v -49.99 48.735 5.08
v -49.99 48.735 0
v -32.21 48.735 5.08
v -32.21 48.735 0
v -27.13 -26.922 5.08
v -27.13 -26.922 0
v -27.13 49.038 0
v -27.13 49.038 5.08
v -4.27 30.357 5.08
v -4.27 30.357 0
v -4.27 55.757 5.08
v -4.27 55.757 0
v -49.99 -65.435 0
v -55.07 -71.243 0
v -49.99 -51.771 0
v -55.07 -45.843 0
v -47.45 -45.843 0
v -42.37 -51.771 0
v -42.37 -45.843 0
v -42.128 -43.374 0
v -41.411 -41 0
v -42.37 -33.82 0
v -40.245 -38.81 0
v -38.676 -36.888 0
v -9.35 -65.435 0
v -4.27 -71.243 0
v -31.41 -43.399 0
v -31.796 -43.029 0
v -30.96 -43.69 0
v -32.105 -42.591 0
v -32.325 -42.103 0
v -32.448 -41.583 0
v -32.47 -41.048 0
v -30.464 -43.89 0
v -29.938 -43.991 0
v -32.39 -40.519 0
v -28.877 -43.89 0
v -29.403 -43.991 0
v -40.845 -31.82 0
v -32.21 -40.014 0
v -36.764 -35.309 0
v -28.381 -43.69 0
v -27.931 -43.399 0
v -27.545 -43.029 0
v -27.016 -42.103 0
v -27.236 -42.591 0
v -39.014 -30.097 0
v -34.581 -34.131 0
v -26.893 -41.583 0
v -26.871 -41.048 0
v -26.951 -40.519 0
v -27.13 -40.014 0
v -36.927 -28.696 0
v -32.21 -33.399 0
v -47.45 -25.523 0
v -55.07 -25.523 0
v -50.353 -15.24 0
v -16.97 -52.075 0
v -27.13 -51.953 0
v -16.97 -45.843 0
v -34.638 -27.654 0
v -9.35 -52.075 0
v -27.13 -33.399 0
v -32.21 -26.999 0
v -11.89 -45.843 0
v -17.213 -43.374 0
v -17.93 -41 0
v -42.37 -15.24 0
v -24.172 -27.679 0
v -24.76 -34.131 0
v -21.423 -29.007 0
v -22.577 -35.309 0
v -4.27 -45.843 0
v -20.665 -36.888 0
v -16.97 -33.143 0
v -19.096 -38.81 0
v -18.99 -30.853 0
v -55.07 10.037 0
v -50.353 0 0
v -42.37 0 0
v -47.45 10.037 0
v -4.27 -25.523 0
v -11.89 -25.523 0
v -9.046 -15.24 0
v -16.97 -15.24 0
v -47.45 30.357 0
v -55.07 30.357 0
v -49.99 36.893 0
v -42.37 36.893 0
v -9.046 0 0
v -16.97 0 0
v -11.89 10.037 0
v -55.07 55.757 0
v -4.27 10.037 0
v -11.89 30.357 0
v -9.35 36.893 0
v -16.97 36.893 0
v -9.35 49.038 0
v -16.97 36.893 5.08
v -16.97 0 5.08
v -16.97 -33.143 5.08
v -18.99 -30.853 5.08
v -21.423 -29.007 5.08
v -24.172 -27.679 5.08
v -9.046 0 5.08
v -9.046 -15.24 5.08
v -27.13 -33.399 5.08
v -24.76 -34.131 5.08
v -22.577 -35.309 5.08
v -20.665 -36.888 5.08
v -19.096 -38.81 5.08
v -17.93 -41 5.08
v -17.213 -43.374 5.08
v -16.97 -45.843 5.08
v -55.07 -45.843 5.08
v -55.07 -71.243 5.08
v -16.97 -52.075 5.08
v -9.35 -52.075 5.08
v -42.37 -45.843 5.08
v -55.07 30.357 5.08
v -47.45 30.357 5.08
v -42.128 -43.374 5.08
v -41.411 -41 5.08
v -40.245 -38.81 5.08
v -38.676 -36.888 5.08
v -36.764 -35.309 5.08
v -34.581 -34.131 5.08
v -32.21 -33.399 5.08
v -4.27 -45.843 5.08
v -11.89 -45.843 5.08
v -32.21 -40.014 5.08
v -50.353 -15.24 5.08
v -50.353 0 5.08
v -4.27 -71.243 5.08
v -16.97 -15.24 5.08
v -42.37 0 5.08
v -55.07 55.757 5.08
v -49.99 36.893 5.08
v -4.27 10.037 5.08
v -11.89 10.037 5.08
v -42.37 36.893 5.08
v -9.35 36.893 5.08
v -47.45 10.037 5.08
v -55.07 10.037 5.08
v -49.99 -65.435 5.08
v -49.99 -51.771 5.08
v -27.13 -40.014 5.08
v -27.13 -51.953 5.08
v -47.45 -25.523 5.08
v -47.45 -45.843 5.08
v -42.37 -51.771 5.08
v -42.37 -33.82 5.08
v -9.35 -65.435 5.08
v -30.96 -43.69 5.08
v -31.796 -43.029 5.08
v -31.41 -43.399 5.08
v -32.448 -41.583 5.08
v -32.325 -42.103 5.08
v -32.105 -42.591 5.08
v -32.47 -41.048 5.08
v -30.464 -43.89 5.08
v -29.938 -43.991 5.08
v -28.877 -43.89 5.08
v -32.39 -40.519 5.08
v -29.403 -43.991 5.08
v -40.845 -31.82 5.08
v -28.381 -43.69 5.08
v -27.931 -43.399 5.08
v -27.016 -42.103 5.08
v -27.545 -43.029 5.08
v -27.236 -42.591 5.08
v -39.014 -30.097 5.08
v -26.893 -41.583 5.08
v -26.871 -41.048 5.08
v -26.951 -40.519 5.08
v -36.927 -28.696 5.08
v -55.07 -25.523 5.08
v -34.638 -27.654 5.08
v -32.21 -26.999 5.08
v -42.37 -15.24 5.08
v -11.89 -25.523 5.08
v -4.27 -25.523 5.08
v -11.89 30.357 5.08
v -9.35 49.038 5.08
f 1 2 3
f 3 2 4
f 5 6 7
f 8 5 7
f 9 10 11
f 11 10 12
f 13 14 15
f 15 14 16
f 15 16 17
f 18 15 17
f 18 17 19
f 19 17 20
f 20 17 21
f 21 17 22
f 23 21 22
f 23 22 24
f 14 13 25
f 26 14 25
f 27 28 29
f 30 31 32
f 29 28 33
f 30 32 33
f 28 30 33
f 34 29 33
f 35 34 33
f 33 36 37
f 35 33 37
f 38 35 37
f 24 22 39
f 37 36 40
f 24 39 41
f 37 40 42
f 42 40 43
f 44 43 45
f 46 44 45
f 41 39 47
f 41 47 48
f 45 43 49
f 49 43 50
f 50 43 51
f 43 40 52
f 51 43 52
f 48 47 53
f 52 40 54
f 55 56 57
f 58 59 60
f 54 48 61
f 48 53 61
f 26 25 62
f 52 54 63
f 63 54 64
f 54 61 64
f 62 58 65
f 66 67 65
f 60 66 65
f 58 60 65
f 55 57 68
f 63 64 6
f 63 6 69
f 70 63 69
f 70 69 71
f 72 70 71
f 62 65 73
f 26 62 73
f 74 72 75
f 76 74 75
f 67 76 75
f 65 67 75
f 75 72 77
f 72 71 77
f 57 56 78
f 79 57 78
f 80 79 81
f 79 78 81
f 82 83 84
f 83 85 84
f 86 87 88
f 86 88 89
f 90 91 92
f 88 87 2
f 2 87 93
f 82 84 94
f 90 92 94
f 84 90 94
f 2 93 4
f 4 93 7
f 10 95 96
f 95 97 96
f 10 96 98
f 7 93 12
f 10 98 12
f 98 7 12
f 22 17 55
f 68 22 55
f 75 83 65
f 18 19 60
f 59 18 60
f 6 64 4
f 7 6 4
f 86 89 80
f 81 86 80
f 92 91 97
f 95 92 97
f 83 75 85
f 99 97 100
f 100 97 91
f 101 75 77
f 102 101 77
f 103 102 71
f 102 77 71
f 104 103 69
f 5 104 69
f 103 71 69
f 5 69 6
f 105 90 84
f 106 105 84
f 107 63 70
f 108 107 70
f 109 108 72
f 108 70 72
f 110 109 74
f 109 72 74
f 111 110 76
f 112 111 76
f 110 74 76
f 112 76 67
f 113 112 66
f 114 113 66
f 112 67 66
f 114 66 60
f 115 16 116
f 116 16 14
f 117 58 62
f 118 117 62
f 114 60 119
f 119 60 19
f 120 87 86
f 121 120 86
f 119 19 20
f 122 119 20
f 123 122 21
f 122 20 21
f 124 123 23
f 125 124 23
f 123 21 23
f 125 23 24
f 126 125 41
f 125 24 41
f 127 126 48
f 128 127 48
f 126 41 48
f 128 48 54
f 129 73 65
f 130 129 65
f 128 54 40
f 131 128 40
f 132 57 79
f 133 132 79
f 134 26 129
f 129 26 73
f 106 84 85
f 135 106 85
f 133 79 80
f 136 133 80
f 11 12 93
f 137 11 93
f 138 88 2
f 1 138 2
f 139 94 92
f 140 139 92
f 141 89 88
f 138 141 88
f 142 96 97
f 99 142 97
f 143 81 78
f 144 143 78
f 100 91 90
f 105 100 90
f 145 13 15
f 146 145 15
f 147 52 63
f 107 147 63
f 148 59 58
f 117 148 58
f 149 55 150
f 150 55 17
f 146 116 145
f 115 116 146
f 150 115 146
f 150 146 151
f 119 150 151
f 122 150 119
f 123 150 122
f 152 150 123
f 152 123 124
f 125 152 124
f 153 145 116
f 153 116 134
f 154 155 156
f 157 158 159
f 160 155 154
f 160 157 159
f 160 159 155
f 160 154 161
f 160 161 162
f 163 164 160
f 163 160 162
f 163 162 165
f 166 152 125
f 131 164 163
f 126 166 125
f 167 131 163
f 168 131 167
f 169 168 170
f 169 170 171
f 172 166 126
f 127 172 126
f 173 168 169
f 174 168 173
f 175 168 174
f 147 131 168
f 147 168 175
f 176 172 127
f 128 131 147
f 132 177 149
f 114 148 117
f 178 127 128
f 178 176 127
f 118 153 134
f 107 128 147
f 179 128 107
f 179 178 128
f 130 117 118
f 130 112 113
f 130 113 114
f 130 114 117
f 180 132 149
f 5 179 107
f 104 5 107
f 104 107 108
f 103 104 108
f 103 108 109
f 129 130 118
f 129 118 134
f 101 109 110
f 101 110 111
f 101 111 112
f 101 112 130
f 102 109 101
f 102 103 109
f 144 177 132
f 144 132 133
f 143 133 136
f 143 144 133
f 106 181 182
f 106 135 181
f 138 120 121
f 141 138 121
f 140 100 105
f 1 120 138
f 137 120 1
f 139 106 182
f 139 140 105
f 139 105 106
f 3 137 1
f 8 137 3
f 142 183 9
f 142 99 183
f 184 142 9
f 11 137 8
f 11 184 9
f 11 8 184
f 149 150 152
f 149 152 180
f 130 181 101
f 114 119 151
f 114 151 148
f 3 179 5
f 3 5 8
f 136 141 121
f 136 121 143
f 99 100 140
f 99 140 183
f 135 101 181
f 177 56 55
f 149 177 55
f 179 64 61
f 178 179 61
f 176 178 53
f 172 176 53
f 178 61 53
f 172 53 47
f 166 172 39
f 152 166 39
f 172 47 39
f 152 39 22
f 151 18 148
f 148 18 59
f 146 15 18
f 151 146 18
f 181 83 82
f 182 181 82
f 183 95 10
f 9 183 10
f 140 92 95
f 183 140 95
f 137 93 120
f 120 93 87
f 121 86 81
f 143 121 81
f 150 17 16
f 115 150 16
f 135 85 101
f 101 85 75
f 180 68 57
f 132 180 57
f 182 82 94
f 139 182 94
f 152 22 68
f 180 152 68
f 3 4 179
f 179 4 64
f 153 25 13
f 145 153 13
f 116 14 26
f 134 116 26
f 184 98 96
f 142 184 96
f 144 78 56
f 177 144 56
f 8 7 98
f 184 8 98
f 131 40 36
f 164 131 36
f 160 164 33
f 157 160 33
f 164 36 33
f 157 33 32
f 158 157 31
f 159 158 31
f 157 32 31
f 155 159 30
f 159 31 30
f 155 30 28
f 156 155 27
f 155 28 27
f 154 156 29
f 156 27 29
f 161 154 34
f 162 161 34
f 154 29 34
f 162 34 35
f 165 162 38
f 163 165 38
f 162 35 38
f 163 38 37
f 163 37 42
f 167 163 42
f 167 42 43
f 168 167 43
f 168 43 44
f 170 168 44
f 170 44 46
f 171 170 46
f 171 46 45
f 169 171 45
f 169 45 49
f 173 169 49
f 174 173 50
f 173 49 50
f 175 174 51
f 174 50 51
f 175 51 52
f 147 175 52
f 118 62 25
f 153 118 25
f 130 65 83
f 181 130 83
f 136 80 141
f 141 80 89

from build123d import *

# Parameters (mm, degrees)
F1_DEPTH = 5.08


with BuildPart() as f1:
    # F0 (on Top) → F1 (new body)
    with BuildSketch(Plane.XY):
        Polygon((-4.270472, 55.757098), (-55.070472, 55.757098), (-55.070472, 30.357098), (-47.450472, 30.357098), (-47.450472, 10.037098), (-55.070472, 10.037098), (-55.070472, -25.522902), (-47.450472, -25.522902), (-47.450472, -45.842902), (-55.070472, -45.842902), (-55.070472, -71.242902), (-4.270472, -71.242902), (-4.270472, -45.842902), (-11.890472, -45.842902), (-11.890472, -25.522902), (-4.270472, -25.522902), (-4.270472, 10.037098), (-11.890472, 10.037098), (-11.890472, 30.357098), (-4.270472, 30.357098), align=None)
        Polygon((-49.990472, -51.771179), (-42.370472, -51.771179), (-32.210472, -51.892635), (-27.130472, -51.953363), (-16.970472, -52.07482), (-9.350472, -52.07482), (-9.350472, -65.435126), (-27.130472, -65.435126), (-32.210472, -65.435126), (-49.990472, -65.435126), align=None, mode=Mode.SUBTRACT)
        with BuildLine():
            Line((-16.970472, -45.842902), (-42.370472, -45.842902))
            ThreePointArc((-42.370472, -45.842902), (-39.50785, -37.810717), (-32.210472, -33.399494))
            Line((-32.210472, -33.399494), (-32.210472, -40.014148))
            ThreePointArc((-32.210472, -40.014148), (-29.670472, -44.004216), (-27.130472, -40.014148))
            Line((-27.130472, -40.014148), (-27.130472, -33.399494))
            ThreePointArc((-27.130472, -33.399494), (-19.833094, -37.810717), (-16.970472, -45.842902))
        make_face(mode=Mode.SUBTRACT)
        with BuildLine():
            Line((-49.990472, 48.734743), (-42.370472, 48.734743))
            Line((-42.370472, 48.734743), (-32.210472, 48.734743))
            Line((-32.210472, 48.734743), (-32.210472, -26.999166))
            ThreePointArc((-32.210472, -26.999166), (-37.999229, -29.353544), (-42.370472, -33.81953))
            Line((-42.370472, -33.81953), (-42.370472, -15.24))
            Line((-42.370472, -15.24), (-50.352603, -15.24))
            Line((-50.352603, -15.24), (-50.352603, 0))
            Line((-50.352603, 0), (-42.370472, 0))
            Line((-42.370472, 0), (-42.370472, 36.892656))
            Line((-42.370472, 36.892656), (-49.990472, 36.892656))
            Line((-49.990472, 36.892656), (-49.990472, 48.734743))
        make_face(mode=Mode.SUBTRACT)
        with BuildLine():
            Line((-27.130472, -26.922115), (-27.130472, 49.038388))
            Line((-27.130472, 49.038388), (-16.970472, 49.038388))
            Line((-16.970472, 49.038388), (-9.350472, 49.038388))
            Line((-9.350472, 49.038388), (-9.350472, 36.892656))
            Line((-9.350472, 36.892656), (-16.970472, 36.892656))
            Line((-16.970472, 36.892656), (-16.970472, 0))
            Line((-16.970472, 0), (-9.046003, 0))
            Line((-9.046003, 0), (-9.046003, -15.24))
            Line((-9.046003, -15.24), (-16.970472, -15.24))
            Line((-16.970472, -15.24), (-16.970472, -33.142902))
            ThreePointArc((-16.970472, -33.142902), (-21.422603, -29.007051), (-27.130472, -26.922115))
        make_face(mode=Mode.SUBTRACT)
    extrude(amount=F1_DEPTH)


solid = f1.part
